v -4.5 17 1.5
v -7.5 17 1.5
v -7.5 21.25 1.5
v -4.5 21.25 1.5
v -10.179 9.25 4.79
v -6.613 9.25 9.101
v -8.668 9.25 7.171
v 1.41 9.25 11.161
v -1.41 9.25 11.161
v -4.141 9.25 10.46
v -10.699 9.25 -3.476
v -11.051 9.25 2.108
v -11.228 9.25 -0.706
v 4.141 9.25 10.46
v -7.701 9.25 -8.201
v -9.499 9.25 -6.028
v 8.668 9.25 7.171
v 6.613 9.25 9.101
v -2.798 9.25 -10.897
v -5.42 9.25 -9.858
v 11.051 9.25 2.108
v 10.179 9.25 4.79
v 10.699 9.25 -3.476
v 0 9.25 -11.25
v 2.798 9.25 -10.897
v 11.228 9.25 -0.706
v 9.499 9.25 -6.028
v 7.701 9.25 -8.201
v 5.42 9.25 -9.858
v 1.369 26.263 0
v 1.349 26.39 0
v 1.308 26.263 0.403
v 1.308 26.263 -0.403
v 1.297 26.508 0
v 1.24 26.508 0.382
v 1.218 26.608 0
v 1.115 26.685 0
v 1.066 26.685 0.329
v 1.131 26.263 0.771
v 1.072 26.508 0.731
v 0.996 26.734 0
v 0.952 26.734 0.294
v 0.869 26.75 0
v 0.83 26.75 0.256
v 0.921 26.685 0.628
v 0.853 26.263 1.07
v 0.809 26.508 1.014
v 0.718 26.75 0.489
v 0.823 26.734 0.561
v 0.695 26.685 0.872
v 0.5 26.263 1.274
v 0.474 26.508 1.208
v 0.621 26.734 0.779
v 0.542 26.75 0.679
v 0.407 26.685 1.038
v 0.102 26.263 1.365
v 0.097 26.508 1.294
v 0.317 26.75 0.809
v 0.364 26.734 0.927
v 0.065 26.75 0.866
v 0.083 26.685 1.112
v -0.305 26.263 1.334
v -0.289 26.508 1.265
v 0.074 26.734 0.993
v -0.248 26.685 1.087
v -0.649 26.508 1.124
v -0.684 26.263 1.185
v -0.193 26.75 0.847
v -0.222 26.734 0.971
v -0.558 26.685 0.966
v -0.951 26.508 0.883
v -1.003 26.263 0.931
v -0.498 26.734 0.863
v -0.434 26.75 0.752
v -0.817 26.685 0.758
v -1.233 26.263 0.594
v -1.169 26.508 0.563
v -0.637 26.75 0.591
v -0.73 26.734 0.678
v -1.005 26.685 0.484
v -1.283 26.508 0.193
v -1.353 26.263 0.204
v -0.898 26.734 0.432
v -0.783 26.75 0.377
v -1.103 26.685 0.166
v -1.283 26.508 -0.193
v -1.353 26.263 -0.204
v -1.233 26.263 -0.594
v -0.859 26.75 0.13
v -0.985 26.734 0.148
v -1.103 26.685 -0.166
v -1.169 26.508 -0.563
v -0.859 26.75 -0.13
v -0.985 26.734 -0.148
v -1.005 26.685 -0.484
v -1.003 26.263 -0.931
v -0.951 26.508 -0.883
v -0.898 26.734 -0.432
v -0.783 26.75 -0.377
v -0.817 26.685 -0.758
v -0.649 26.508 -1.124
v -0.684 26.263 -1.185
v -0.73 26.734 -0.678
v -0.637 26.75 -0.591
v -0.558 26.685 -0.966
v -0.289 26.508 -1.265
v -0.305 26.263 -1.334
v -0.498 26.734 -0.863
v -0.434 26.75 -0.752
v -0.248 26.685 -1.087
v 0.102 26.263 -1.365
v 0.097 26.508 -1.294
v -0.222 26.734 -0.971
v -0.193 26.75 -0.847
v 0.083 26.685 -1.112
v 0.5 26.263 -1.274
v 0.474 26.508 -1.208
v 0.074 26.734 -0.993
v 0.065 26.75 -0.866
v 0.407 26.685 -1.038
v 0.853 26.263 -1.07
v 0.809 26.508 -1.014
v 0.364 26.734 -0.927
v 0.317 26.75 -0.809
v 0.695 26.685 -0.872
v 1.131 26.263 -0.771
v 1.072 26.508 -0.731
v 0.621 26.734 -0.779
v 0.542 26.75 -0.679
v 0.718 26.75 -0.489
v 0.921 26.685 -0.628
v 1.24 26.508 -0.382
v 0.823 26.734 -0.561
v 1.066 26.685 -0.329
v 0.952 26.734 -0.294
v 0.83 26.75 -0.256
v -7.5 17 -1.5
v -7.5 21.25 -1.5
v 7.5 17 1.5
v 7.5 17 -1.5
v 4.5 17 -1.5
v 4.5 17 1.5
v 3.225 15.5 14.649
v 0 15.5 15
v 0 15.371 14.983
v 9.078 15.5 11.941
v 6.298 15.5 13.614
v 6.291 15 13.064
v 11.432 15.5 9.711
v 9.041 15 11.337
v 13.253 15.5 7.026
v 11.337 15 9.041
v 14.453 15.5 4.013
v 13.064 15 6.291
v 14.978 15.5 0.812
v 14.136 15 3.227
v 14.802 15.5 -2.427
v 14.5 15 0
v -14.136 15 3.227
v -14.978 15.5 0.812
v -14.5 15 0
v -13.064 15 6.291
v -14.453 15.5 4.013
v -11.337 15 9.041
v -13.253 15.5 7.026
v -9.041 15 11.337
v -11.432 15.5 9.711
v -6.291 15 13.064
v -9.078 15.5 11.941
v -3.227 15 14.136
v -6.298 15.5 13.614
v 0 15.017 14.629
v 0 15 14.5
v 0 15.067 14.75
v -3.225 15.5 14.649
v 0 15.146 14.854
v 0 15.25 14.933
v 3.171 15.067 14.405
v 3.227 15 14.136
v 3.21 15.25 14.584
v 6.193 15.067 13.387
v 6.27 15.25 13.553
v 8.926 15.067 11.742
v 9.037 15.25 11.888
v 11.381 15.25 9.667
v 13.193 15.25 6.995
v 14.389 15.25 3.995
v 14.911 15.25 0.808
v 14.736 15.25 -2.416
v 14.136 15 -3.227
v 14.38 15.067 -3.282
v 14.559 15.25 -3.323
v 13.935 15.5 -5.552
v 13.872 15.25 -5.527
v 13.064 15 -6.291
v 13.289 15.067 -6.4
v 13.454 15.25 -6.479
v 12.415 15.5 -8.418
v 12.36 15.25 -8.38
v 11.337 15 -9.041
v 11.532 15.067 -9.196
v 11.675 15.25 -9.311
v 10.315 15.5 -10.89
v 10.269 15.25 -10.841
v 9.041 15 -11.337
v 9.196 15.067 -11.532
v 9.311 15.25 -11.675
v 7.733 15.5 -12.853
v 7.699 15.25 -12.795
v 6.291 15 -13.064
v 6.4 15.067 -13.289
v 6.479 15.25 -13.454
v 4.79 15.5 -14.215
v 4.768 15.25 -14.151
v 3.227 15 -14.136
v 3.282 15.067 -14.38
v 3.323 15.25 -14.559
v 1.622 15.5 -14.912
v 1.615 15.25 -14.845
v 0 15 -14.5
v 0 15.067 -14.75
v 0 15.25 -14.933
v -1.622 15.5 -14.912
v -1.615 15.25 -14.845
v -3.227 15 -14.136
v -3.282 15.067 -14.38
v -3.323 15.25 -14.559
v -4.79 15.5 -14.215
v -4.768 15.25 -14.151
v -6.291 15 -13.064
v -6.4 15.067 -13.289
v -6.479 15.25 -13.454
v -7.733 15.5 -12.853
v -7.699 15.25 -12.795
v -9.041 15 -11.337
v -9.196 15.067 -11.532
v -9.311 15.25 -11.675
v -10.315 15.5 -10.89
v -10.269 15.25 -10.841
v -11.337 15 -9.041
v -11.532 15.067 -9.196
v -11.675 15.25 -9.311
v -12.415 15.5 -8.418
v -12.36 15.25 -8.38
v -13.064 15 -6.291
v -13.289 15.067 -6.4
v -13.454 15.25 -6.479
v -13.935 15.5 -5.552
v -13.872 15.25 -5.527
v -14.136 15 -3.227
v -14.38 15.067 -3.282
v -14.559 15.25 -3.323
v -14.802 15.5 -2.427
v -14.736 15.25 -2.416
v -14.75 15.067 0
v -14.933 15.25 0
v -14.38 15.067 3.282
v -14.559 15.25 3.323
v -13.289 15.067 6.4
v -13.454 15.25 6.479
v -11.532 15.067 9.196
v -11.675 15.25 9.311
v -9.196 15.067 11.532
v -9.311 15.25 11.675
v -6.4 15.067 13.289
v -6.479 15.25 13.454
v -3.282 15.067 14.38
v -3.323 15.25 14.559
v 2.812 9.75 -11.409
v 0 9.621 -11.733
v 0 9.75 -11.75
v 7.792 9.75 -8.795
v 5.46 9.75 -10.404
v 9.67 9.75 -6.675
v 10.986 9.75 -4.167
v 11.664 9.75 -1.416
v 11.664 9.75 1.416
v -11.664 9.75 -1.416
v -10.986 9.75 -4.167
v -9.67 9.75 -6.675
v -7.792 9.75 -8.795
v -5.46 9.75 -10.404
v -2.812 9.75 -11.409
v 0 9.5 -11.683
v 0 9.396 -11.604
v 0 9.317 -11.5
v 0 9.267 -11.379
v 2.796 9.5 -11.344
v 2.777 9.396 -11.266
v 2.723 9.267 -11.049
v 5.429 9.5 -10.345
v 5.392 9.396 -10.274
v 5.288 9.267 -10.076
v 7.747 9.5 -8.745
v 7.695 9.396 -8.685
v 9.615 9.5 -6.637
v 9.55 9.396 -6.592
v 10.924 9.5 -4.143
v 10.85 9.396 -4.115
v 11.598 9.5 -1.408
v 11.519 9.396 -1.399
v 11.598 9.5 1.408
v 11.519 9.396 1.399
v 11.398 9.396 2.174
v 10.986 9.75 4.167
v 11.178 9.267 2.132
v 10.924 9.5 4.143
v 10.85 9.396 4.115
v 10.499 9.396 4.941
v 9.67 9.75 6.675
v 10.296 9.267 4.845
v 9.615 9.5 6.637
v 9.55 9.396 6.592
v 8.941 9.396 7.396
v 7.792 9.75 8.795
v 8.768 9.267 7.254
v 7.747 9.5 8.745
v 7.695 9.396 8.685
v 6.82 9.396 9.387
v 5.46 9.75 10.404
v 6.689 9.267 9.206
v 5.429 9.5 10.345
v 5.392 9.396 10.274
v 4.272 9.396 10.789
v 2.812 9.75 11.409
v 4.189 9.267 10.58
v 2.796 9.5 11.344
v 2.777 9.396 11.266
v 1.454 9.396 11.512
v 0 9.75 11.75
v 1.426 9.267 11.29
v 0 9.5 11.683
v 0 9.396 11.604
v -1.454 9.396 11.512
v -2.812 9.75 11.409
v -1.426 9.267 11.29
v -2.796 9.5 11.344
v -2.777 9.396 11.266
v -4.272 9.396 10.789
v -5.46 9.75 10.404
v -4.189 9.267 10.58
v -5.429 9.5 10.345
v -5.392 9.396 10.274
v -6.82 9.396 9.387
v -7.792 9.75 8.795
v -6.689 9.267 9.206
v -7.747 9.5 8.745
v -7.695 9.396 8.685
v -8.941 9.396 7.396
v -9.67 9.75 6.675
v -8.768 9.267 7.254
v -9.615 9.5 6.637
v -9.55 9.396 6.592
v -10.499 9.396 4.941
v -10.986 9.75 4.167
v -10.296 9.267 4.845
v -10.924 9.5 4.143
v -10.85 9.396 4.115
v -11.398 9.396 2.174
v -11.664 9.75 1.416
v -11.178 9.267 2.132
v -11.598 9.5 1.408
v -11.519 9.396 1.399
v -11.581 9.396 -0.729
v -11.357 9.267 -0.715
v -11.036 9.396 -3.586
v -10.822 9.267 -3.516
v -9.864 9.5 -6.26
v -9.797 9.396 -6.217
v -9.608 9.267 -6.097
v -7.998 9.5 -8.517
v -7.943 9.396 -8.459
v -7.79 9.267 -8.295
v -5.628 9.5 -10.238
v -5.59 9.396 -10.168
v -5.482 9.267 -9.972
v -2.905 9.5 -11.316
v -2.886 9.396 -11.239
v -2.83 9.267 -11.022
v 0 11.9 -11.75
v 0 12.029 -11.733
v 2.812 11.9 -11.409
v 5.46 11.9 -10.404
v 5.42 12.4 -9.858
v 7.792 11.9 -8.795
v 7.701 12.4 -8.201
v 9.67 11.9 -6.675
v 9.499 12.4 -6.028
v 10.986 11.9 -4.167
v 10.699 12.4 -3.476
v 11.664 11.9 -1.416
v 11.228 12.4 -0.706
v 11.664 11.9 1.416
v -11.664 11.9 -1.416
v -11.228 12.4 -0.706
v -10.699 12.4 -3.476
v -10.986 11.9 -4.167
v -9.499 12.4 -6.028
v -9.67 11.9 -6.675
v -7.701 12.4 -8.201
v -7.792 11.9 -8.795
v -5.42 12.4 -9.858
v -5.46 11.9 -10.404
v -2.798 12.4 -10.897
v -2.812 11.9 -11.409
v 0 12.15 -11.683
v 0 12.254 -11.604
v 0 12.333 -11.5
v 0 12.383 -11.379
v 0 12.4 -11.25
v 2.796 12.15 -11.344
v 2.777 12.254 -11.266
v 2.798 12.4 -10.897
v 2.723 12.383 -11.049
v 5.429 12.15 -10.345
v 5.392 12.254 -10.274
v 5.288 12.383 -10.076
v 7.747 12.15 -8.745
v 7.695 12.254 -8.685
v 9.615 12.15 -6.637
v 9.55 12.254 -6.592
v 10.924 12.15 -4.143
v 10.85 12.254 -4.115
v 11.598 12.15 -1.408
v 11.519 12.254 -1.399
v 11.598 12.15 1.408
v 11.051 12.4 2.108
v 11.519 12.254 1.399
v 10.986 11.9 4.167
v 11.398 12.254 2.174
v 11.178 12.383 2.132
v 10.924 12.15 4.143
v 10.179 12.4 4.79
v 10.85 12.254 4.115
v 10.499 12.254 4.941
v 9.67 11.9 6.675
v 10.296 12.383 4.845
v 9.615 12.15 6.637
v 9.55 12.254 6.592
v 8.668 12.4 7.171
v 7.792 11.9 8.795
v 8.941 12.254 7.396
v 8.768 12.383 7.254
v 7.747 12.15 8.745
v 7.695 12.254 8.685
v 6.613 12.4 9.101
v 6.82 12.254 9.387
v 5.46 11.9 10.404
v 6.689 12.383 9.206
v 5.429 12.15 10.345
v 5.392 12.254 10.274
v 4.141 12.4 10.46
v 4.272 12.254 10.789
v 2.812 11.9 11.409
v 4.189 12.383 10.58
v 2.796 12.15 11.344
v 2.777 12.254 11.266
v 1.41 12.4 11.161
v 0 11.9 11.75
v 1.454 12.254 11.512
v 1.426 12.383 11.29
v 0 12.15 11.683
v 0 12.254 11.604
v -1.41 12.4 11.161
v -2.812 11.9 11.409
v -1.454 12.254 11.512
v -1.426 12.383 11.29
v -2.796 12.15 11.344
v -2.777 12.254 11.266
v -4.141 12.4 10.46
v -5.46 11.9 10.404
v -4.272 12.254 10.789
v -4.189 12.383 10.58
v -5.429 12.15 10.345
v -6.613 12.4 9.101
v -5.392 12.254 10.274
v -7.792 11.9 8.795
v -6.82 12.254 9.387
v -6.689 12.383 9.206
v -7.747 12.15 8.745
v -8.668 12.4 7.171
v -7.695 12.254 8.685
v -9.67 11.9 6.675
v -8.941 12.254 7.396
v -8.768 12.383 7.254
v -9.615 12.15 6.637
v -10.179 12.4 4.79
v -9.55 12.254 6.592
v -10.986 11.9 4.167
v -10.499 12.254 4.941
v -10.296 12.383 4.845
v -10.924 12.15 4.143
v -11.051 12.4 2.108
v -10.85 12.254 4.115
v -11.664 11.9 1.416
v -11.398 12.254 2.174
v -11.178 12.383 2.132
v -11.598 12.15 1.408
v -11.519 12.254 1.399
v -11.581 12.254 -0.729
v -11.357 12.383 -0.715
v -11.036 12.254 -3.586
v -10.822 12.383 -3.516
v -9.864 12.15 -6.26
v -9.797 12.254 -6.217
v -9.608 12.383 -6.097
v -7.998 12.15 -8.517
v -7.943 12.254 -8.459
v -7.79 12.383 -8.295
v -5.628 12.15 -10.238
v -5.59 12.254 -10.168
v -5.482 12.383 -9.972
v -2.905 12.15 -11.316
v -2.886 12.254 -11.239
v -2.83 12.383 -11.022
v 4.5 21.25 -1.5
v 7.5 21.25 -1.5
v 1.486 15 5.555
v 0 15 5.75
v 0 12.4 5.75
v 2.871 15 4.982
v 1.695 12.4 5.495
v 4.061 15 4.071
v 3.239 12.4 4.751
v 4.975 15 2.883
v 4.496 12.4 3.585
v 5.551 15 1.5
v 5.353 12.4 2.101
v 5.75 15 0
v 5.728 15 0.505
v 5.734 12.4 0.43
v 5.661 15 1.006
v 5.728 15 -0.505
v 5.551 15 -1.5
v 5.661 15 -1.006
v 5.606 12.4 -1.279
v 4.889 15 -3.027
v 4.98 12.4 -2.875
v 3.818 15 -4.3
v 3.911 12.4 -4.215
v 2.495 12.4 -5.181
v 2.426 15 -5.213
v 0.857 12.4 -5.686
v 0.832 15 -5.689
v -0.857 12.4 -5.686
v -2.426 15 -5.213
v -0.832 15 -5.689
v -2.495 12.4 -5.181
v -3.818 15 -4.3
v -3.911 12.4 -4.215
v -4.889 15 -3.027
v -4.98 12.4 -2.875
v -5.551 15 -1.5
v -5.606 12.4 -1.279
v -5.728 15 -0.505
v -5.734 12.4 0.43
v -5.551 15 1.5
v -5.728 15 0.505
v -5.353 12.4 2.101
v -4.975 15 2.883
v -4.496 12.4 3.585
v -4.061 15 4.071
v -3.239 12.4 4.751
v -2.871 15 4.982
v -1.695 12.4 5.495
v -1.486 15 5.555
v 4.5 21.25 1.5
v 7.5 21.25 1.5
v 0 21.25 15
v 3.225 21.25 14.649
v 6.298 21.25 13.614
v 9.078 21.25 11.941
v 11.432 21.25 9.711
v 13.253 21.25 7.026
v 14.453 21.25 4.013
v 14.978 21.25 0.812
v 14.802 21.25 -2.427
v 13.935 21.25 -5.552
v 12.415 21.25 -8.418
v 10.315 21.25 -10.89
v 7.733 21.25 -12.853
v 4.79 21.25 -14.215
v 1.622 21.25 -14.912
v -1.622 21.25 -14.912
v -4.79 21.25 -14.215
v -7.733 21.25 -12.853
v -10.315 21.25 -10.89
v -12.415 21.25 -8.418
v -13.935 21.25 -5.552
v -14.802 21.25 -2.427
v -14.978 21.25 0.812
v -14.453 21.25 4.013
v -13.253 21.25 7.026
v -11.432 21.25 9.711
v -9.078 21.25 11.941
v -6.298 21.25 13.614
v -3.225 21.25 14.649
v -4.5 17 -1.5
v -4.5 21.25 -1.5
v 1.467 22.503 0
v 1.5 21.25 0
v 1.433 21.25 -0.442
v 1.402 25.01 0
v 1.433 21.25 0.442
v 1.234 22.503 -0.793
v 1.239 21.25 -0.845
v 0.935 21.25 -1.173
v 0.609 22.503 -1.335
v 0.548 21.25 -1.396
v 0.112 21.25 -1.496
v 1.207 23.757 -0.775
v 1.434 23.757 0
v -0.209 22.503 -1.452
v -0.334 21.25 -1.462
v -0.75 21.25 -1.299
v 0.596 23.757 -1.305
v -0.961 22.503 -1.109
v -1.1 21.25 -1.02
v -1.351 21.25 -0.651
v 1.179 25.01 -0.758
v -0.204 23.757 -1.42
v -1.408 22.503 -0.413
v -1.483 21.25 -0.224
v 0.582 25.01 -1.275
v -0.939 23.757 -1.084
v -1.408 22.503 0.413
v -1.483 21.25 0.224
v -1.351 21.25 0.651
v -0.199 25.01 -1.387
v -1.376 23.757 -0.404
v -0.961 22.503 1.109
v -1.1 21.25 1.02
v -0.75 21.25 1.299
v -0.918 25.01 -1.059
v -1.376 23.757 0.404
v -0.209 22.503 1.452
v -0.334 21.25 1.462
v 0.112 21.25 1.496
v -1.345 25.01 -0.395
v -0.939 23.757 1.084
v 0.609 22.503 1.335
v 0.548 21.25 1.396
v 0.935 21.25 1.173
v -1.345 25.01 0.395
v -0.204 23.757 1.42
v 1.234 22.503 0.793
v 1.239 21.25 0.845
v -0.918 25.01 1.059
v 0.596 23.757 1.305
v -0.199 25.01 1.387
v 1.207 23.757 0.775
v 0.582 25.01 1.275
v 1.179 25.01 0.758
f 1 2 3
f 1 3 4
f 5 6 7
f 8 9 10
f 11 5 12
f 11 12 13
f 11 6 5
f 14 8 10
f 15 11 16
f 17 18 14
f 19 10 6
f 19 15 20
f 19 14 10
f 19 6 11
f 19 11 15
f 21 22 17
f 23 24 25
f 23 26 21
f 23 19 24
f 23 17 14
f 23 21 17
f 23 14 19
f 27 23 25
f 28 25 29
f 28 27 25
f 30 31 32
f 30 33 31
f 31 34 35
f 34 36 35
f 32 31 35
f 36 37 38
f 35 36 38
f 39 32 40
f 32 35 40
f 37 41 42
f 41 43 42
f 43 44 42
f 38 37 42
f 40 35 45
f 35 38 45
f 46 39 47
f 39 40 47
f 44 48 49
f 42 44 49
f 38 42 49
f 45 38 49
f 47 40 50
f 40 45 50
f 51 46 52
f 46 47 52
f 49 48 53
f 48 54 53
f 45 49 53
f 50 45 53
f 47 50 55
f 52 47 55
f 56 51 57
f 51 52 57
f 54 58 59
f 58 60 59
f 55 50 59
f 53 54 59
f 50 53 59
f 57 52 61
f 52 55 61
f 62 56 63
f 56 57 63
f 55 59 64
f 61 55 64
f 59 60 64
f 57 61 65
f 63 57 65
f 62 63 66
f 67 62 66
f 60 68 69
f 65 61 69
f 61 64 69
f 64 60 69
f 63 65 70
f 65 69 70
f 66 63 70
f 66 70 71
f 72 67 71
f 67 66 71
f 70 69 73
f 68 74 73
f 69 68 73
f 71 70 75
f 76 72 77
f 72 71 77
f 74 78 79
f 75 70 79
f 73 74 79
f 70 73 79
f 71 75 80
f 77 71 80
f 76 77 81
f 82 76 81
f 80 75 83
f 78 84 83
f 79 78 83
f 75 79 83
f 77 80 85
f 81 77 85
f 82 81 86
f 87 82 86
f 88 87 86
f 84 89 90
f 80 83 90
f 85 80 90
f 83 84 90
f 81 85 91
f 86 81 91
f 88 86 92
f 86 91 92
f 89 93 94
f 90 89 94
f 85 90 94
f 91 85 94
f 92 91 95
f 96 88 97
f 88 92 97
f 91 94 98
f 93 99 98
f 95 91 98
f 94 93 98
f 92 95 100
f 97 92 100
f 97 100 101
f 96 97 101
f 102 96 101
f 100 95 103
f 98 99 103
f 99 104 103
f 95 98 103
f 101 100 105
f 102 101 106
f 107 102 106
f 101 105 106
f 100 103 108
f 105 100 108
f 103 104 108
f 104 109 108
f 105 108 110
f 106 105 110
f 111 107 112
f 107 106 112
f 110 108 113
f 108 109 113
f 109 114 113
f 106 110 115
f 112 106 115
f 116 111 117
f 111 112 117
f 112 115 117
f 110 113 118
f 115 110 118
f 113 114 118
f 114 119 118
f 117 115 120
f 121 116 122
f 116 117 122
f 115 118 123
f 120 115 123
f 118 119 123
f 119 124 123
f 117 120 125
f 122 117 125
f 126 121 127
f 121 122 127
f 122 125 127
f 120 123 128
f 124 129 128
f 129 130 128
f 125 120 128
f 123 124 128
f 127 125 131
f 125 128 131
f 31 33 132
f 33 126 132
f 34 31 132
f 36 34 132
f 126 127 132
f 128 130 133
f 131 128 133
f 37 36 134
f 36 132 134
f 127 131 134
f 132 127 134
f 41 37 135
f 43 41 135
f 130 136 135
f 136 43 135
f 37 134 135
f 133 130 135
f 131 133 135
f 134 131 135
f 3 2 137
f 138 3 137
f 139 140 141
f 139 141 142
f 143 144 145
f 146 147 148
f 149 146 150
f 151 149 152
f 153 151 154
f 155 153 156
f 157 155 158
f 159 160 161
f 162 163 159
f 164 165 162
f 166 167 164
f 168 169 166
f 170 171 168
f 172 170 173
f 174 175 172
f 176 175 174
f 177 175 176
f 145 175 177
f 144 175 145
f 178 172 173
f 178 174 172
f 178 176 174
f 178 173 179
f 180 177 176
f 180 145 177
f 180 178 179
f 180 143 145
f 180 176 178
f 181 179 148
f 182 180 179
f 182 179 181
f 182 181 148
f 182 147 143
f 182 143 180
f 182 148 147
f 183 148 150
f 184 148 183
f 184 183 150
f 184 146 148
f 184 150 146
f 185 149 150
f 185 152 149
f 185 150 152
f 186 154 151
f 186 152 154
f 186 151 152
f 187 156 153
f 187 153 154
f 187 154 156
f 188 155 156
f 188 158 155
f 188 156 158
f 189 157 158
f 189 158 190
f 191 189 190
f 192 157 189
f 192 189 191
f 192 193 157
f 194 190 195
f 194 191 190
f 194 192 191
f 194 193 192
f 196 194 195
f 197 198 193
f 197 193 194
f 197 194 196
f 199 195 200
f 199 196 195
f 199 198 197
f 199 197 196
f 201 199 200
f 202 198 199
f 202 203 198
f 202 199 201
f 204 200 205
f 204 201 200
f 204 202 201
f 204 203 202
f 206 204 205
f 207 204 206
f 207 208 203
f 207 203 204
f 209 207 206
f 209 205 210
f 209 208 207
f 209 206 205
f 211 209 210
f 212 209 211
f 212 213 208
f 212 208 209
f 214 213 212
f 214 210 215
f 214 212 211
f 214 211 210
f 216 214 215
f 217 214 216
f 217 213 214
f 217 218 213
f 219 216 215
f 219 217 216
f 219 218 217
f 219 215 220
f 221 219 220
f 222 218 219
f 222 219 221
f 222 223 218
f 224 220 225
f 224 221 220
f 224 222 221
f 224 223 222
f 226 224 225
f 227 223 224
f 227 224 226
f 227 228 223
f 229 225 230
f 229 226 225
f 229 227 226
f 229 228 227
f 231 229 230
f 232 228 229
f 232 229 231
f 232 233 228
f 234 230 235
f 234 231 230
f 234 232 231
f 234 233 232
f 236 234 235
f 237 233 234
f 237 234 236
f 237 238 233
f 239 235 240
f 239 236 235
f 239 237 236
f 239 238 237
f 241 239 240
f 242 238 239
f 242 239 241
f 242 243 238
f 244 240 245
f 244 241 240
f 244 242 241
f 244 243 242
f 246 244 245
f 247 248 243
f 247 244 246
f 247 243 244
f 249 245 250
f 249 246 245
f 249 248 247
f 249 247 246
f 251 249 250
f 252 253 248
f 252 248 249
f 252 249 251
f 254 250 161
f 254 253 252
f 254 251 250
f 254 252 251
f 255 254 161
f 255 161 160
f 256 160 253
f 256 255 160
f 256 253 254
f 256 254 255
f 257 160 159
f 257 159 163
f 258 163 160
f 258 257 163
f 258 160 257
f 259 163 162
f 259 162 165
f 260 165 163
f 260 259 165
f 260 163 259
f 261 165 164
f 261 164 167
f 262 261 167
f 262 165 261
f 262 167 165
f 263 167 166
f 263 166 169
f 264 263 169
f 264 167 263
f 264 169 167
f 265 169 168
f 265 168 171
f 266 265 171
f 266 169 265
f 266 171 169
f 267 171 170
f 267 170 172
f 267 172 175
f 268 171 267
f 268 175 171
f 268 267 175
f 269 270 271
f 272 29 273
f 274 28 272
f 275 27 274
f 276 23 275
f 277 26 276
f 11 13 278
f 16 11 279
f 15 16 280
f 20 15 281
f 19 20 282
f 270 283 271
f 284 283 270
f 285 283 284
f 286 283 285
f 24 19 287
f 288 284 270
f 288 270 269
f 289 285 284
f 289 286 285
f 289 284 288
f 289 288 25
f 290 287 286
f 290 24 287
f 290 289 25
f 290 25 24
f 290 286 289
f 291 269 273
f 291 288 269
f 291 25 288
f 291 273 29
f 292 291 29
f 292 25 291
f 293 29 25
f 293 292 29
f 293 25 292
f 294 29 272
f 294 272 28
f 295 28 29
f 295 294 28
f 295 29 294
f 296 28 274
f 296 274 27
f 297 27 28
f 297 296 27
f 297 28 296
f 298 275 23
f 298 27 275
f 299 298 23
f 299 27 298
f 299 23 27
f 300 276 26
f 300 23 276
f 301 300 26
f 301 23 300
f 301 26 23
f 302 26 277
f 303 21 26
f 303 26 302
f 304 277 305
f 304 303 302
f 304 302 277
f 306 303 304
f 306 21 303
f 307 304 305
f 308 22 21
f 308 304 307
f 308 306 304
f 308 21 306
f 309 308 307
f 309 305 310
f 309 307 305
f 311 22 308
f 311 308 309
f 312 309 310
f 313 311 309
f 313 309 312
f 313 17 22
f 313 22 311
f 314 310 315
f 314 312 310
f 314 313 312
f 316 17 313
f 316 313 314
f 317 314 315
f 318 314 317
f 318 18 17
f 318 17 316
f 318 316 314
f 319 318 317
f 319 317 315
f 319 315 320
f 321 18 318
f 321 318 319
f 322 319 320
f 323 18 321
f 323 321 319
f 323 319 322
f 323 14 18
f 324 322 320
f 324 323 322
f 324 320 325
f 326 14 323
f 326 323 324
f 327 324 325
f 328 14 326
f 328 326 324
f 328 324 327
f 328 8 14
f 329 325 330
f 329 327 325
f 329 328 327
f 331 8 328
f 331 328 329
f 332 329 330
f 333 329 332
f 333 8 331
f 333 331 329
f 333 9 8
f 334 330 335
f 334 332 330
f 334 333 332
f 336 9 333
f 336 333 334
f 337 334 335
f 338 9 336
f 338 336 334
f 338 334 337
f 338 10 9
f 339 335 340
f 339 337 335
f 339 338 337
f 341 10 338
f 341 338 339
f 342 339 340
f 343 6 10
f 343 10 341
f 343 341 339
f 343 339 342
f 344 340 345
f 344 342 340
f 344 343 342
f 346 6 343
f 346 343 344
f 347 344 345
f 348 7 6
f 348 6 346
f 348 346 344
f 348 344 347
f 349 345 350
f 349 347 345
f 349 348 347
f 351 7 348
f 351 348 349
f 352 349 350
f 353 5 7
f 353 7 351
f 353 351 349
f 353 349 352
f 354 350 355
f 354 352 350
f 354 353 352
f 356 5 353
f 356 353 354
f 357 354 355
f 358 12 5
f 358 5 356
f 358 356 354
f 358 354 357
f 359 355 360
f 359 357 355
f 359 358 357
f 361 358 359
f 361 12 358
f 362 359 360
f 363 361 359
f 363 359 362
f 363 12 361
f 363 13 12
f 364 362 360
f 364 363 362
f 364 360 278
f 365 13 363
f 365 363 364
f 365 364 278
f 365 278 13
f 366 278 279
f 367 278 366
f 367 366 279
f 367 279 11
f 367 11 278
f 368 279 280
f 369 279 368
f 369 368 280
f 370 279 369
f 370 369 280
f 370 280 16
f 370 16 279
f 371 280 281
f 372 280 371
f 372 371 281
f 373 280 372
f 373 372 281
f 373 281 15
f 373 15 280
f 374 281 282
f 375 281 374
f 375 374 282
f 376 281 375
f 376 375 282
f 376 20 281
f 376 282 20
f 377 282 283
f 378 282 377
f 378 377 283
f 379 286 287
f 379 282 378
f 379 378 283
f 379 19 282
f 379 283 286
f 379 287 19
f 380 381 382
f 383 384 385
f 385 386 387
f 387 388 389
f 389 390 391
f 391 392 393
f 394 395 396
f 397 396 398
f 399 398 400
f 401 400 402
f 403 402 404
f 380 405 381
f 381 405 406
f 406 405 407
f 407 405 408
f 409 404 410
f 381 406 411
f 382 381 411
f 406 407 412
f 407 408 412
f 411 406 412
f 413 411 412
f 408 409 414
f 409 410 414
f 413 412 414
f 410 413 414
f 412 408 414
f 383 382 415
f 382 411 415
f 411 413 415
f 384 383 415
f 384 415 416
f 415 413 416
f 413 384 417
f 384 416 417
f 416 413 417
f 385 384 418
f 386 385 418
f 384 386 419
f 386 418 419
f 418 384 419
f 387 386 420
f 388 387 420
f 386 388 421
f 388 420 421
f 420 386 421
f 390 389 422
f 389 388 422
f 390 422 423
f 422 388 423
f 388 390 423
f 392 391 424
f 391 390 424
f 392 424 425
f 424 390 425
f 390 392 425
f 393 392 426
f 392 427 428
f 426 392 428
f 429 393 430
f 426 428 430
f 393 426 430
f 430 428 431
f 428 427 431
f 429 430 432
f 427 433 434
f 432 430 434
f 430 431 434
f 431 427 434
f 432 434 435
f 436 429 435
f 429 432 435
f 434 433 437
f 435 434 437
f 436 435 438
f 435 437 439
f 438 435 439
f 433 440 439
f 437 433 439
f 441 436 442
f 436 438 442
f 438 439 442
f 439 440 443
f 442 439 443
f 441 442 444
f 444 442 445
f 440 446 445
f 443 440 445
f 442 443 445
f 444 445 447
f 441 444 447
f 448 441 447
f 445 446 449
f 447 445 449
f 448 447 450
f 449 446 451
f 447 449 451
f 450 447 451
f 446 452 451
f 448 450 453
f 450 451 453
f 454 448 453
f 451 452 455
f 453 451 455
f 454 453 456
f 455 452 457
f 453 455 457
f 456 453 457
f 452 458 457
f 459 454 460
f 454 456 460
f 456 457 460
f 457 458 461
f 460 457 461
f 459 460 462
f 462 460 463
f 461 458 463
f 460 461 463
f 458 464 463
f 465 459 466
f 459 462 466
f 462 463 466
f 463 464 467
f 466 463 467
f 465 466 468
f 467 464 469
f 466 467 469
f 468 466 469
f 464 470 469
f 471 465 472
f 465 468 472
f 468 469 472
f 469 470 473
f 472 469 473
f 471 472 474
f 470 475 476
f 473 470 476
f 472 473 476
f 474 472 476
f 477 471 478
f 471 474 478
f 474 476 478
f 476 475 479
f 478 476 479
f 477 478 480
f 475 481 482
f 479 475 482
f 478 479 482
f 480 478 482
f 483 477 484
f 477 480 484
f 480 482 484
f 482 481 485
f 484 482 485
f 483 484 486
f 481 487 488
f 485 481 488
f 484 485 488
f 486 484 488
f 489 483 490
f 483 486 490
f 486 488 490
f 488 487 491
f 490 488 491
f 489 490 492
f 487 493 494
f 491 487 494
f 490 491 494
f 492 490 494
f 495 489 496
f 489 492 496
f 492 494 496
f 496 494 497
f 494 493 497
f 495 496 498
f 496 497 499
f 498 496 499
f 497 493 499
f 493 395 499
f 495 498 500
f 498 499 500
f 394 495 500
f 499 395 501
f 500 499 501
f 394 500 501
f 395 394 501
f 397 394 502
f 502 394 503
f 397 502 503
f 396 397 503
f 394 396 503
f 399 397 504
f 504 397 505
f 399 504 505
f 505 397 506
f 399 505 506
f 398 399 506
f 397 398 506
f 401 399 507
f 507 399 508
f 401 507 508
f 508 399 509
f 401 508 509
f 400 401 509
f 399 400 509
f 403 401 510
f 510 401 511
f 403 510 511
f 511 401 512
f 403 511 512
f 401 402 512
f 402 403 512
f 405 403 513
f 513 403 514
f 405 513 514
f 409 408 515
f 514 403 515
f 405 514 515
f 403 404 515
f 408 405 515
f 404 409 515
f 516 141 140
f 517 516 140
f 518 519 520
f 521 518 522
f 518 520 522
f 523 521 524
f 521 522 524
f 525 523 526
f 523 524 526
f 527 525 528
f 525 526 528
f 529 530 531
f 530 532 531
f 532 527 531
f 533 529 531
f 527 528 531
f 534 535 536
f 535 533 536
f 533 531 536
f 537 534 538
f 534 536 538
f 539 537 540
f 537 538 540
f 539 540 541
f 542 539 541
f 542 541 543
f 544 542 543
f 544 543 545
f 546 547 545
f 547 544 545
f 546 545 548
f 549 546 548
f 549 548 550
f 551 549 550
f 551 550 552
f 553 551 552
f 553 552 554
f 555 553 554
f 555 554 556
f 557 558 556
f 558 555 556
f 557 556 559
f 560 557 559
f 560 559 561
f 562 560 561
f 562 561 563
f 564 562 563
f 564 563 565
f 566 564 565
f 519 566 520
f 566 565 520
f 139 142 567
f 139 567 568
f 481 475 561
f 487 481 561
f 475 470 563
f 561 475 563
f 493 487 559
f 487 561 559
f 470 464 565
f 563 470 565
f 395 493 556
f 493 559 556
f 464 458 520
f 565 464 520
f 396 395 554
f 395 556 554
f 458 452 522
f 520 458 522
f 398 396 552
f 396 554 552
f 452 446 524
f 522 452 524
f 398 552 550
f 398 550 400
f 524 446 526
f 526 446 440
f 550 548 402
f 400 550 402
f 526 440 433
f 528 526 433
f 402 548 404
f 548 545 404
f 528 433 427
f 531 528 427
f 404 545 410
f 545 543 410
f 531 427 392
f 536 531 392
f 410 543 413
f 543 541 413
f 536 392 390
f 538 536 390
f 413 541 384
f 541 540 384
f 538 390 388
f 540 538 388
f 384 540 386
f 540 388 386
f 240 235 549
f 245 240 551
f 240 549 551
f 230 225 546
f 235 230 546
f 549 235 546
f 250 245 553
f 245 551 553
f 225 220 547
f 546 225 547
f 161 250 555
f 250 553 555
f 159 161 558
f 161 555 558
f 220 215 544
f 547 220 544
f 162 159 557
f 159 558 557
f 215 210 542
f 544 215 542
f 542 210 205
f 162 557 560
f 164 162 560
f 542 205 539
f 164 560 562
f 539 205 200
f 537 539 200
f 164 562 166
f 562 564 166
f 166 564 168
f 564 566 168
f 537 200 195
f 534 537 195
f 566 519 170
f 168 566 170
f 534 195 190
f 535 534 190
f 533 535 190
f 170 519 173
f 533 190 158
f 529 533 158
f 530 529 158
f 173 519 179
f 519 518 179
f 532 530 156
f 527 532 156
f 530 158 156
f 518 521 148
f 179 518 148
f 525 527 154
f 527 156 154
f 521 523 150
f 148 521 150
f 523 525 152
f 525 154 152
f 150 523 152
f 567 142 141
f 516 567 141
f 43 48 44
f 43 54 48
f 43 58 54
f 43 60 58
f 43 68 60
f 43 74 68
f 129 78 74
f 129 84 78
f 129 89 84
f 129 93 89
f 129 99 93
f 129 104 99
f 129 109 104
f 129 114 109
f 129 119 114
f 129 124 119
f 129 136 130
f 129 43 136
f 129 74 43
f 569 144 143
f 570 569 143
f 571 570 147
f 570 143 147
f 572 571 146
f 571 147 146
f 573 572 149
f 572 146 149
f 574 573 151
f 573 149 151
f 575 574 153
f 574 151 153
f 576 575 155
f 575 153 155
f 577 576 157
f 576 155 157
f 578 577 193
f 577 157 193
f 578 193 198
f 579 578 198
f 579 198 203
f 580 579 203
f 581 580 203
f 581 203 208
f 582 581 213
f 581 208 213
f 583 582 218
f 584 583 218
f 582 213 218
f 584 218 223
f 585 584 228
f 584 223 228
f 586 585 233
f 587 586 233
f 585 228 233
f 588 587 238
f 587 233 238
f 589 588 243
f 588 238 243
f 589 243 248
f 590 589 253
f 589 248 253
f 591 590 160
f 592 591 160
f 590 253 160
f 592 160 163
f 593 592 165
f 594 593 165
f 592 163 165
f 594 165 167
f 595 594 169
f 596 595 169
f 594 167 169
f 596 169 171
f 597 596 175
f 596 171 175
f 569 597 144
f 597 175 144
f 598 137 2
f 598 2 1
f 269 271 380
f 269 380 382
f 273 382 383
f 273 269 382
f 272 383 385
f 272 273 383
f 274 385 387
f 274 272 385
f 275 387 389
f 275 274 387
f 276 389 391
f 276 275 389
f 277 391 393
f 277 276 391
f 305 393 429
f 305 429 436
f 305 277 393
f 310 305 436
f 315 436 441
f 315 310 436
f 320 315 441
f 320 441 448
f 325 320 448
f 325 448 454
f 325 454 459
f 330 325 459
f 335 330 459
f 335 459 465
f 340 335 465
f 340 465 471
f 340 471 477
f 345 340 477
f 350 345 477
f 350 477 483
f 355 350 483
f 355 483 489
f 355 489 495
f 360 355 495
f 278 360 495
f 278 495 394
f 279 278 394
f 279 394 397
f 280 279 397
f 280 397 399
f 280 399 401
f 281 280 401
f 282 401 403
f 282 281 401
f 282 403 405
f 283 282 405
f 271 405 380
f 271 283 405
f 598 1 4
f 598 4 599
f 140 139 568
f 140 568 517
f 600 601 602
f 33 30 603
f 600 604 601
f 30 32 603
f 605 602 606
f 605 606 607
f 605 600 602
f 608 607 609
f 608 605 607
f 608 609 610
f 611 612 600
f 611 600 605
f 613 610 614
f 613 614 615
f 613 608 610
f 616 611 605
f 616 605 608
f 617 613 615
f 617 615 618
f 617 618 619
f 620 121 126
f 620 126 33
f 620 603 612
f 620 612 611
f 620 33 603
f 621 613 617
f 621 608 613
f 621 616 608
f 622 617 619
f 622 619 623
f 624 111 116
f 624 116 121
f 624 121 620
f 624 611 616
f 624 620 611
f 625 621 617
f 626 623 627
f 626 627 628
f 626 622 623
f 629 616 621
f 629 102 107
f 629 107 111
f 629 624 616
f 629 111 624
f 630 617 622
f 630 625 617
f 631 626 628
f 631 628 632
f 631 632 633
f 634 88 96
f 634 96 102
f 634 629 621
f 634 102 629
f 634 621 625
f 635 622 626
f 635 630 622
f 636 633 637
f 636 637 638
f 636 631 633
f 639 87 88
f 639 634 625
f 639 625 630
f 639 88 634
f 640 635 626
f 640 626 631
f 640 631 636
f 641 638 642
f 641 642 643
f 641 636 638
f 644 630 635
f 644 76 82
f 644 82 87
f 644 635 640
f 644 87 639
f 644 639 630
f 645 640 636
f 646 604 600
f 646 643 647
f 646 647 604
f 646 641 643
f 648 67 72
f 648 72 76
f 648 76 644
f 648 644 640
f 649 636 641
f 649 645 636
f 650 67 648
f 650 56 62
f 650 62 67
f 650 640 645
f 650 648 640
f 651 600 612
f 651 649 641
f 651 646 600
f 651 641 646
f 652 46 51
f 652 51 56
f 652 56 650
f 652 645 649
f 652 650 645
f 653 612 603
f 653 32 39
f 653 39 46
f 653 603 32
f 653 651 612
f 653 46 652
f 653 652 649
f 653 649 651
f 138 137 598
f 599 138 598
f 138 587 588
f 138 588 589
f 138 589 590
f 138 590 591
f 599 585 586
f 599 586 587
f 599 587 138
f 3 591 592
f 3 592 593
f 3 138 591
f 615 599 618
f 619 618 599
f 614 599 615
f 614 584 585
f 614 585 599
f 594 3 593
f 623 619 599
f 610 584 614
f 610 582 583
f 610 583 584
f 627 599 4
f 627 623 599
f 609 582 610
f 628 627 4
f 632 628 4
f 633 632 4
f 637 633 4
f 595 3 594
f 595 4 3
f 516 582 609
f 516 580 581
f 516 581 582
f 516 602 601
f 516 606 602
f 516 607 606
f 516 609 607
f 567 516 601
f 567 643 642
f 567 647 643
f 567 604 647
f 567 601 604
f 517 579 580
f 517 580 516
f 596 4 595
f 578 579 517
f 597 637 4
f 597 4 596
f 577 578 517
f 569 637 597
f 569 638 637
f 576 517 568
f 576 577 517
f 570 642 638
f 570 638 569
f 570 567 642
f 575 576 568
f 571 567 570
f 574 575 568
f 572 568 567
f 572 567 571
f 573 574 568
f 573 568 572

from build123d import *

# Parameters (mm, degrees)
SKETCH1_R           = 5.75
BOSS_EXTRUDE1_DEPTH = 15
SKETCH12_R          = 5.75
BOSS_EXTRUDE3_DEPTH = 2
SKETCH11_R          = 15
SKETCH11_W          = 3
SKETCH11_H          = 3
BOSS_EXTRUDE2_DEPTH = 4.25
SKETCH13_R          = 1.5
BOSS_EXTRUDE4_DEPTH = 5.5
BOSS_EXTRUDE4_TAPER = 1.5
FILLET2_R           = 0.5
BOSS_EXTRUDE5_START = -2
SKETCH11_2_R        = 15
BOSS_EXTRUDE5_DEPTH = 2
SKETCH14_R          = 11.75
BOSS_EXTRUDE6_DEPTH = 12.4
SKETCH14_2_R        = 11.75
CUT_EXTRUDE1_DEPTH  = 9.25
FILLET3_R           = 0.5


with BuildPart() as part:
    # Sketch1 → Boss-Extrude1 (new body)
    with BuildSketch(Plane(origin=(0, 0, 0), x_dir=(1, 0, 0), z_dir=(0, 1, 0))):
        with Locations(Location((0, 0, 0), (0, 0, 270))):
            Circle(SKETCH1_R)
    extrude(amount=BOSS_EXTRUDE1_DEPTH)

    # Sketch12 → Boss-Extrude3 (add)
    with BuildSketch(Plane(origin=(0, 15, 0), x_dir=(1, 0, 0), z_dir=(0, 1, 0))):
        with Locations(Location((0, 0, 0), (0, 0, 270))):
            Circle(SKETCH12_R)
    extrude(amount=BOSS_EXTRUDE3_DEPTH)

    # Sketch11 → Boss-Extrude2 (add)
    with BuildSketch(Plane(origin=(0, 17, 0), x_dir=(1, 0, 0), z_dir=(0, 1, 0))):
        with Locations(Location((0, 0, 0), (0, 0, 270))):
            Circle(SKETCH11_R)
        with Locations((-6, 0)):
            Rectangle(SKETCH11_W, SKETCH11_H, mode=Mode.SUBTRACT)
        with Locations((6, 0)):
            Rectangle(SKETCH11_W, SKETCH11_H, mode=Mode.SUBTRACT)
    extrude(amount=BOSS_EXTRUDE2_DEPTH)

    # Sketch13 → Boss-Extrude4 (add)
    with BuildSketch(Plane(origin=(0, 21.25, 0), x_dir=(1, 0, 0), z_dir=(0, 1, 0))):
        Circle(SKETCH13_R)
    extrude(amount=BOSS_EXTRUDE4_DEPTH, taper=BOSS_EXTRUDE4_TAPER)

    # Fillet2
    fillet2_edges = [part.edges().sort_by_distance(p)[0] for p in [
        (-1.355977431, 26.75, 0),
    ]]
    fillet(fillet2_edges, radius=FILLET2_R)

    # Sketch11<2> → Boss-Extrude5 (add)
    # profile 1 of 3: a face of its own
    with BuildSketch(Plane(origin=(0, 17, 0), x_dir=(1, 0, 0), z_dir=(0, 1, 0)).offset(BOSS_EXTRUDE5_START)):
        with Locations(Location((0, 0, 0), (0, 0, 270))):
            Circle(SKETCH11_2_R)
        with BuildLine():
            Line((-7.5, -1.5), (-7.5, 1.5))
            Line((-7.5, 1.5), (-5.550900828, 1.5))
            ThreePointArc((-5.550900828, 1.5), (0, 5.75), (5.550900828, 1.5))
            Line((5.550900828, 1.5), (7.5, 1.5))
            Line((7.5, 1.5), (7.5, -1.5))
            Line((7.5, -1.5), (5.550900828, -1.5))
            ThreePointArc((5.550900828, -1.5), (0, -5.75), (-5.550900828, -1.5))
            Line((-5.550900828, -1.5), (-7.5, -1.5))
        make_face(mode=Mode.SUBTRACT)
    # profile 2 of 3: a face of its own
    with BuildSketch(Plane(origin=(0, 17, 0), x_dir=(1, 0, 0), z_dir=(0, 1, 0)).offset(BOSS_EXTRUDE5_START)):
        with BuildLine():
            Line((7.5, 1.5), (5.550900828, 1.5))
            ThreePointArc((5.550900828, 1.5), (5.700007884, 0.756577901), (5.75, 0))
            ThreePointArc((5.75, 0), (5.700007884, -0.756577901), (5.550900828, -1.5))
            Line((5.550900828, -1.5), (7.5, -1.5))
            Line((7.5, -1.5), (7.5, 1.5))
        make_face()
    # profile 3 of 3: a face of its own
    with BuildSketch(Plane(origin=(0, 17, 0), x_dir=(1, 0, 0), z_dir=(0, 1, 0)).offset(BOSS_EXTRUDE5_START)):
        with BuildLine():
            Line((-5.550900828, 1.5), (-7.5, 1.5))
            Line((-7.5, 1.5), (-7.5, -1.5))
            Line((-7.5, -1.5), (-5.550900828, -1.5))
            ThreePointArc((-5.550900828, -1.5), (-5.75, 0), (-5.550900828, 1.5))
        make_face()
    extrude(amount=BOSS_EXTRUDE5_DEPTH)

    # Sketch14 → Boss-Extrude6 (add)
    with BuildSketch(Plane.XZ):
        with Locations(Location((0, 0, 0), (0, 0, 270))):
            Circle(SKETCH14_R)
    extrude(amount=-BOSS_EXTRUDE6_DEPTH)

    # Sketch14<2> → Cut-Extrude1 (cut)
    with BuildSketch(Plane.XZ):
        with Locations(Location((0, 0, 0), (0, 0, 270))):
            Circle(SKETCH14_2_R)
    extrude(amount=-CUT_EXTRUDE1_DEPTH, mode=Mode.SUBTRACT)

    # Fillet3
    fillet3_edges = [part.edges().sort_by_distance(p)[0] for p in [
        (0, 15, -15),
        (0, 12.4, 11.75),
        (0, 9.25, 11.75),
    ]]
    fillet(fillet3_edges, radius=FILLET3_R)


solid = part.part
